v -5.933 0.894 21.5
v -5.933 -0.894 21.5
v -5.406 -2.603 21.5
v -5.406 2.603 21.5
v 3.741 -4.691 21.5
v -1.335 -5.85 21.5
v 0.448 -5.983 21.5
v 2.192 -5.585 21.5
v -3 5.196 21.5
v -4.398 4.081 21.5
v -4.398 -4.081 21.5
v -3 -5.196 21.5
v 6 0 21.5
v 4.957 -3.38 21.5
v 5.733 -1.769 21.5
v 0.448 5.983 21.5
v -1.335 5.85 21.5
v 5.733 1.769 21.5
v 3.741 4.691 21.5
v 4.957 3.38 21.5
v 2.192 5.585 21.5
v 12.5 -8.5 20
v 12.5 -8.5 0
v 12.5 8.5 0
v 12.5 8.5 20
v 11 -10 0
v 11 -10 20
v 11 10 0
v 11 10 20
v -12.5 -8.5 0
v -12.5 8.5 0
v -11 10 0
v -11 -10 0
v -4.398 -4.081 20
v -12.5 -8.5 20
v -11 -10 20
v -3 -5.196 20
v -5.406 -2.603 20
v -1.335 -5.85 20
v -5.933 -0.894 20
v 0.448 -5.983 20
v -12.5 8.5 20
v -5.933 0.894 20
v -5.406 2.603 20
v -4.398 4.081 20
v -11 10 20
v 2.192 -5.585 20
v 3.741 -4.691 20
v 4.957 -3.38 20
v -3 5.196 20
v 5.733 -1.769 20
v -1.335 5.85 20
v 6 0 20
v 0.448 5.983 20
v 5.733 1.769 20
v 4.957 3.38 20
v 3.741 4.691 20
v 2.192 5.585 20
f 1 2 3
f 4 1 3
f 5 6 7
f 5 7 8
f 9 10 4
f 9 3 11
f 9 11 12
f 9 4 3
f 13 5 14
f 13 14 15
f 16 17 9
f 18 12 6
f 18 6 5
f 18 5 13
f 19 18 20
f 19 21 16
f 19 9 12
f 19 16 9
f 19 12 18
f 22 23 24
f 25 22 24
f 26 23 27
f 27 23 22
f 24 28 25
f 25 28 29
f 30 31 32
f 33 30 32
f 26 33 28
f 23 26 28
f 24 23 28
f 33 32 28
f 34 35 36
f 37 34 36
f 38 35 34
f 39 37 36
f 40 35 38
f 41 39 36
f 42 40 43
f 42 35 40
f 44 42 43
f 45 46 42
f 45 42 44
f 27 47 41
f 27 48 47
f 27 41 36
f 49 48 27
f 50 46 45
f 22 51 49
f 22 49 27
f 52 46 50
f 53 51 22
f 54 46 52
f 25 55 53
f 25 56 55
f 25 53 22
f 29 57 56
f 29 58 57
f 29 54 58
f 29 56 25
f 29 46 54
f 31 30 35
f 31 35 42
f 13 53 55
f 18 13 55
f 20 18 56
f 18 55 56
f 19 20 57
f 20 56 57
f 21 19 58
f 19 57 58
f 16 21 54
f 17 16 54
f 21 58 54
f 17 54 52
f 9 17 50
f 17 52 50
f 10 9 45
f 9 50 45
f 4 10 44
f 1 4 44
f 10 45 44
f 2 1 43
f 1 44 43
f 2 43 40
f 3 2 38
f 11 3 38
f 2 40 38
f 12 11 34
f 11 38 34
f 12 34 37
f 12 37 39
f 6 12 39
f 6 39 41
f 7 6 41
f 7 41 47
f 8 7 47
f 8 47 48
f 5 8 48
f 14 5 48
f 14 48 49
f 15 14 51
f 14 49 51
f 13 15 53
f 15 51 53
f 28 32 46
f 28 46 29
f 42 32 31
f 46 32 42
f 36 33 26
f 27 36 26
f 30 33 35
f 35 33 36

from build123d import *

# Parameters (mm, degrees)
SKETCH2_W           = 25
SKETCH2_H           = 20
BOSS_EXTRUDE1_DEPTH = 20
CHAMFER1_SIZE       = 1.5
SKETCH3_R           = 6
BOSS_EXTRUDE2_DEPTH = 1.5


with BuildPart() as part:
    # Sketch2 → Boss-Extrude1 (new body)
    with BuildSketch(Plane.XY):
        Rectangle(SKETCH2_W, SKETCH2_H)
    extrude(amount=BOSS_EXTRUDE1_DEPTH)

    # Chamfer1
    chamfer1_edges = [part.edges().sort_by_distance(p)[0] for p in [
        (12.5, -10, 10),
        (-12.5, -10, 10),
        (-12.5, 10, 10),
        (12.5, 10, 10),
    ]]
    chamfer(chamfer1_edges, length=CHAMFER1_SIZE)

    # Sketch3 → Boss-Extrude2 (add)
    with BuildSketch(Plane.XY.offset(20)):
        Circle(SKETCH3_R)
    extrude(amount=BOSS_EXTRUDE2_DEPTH)


solid = part.part
